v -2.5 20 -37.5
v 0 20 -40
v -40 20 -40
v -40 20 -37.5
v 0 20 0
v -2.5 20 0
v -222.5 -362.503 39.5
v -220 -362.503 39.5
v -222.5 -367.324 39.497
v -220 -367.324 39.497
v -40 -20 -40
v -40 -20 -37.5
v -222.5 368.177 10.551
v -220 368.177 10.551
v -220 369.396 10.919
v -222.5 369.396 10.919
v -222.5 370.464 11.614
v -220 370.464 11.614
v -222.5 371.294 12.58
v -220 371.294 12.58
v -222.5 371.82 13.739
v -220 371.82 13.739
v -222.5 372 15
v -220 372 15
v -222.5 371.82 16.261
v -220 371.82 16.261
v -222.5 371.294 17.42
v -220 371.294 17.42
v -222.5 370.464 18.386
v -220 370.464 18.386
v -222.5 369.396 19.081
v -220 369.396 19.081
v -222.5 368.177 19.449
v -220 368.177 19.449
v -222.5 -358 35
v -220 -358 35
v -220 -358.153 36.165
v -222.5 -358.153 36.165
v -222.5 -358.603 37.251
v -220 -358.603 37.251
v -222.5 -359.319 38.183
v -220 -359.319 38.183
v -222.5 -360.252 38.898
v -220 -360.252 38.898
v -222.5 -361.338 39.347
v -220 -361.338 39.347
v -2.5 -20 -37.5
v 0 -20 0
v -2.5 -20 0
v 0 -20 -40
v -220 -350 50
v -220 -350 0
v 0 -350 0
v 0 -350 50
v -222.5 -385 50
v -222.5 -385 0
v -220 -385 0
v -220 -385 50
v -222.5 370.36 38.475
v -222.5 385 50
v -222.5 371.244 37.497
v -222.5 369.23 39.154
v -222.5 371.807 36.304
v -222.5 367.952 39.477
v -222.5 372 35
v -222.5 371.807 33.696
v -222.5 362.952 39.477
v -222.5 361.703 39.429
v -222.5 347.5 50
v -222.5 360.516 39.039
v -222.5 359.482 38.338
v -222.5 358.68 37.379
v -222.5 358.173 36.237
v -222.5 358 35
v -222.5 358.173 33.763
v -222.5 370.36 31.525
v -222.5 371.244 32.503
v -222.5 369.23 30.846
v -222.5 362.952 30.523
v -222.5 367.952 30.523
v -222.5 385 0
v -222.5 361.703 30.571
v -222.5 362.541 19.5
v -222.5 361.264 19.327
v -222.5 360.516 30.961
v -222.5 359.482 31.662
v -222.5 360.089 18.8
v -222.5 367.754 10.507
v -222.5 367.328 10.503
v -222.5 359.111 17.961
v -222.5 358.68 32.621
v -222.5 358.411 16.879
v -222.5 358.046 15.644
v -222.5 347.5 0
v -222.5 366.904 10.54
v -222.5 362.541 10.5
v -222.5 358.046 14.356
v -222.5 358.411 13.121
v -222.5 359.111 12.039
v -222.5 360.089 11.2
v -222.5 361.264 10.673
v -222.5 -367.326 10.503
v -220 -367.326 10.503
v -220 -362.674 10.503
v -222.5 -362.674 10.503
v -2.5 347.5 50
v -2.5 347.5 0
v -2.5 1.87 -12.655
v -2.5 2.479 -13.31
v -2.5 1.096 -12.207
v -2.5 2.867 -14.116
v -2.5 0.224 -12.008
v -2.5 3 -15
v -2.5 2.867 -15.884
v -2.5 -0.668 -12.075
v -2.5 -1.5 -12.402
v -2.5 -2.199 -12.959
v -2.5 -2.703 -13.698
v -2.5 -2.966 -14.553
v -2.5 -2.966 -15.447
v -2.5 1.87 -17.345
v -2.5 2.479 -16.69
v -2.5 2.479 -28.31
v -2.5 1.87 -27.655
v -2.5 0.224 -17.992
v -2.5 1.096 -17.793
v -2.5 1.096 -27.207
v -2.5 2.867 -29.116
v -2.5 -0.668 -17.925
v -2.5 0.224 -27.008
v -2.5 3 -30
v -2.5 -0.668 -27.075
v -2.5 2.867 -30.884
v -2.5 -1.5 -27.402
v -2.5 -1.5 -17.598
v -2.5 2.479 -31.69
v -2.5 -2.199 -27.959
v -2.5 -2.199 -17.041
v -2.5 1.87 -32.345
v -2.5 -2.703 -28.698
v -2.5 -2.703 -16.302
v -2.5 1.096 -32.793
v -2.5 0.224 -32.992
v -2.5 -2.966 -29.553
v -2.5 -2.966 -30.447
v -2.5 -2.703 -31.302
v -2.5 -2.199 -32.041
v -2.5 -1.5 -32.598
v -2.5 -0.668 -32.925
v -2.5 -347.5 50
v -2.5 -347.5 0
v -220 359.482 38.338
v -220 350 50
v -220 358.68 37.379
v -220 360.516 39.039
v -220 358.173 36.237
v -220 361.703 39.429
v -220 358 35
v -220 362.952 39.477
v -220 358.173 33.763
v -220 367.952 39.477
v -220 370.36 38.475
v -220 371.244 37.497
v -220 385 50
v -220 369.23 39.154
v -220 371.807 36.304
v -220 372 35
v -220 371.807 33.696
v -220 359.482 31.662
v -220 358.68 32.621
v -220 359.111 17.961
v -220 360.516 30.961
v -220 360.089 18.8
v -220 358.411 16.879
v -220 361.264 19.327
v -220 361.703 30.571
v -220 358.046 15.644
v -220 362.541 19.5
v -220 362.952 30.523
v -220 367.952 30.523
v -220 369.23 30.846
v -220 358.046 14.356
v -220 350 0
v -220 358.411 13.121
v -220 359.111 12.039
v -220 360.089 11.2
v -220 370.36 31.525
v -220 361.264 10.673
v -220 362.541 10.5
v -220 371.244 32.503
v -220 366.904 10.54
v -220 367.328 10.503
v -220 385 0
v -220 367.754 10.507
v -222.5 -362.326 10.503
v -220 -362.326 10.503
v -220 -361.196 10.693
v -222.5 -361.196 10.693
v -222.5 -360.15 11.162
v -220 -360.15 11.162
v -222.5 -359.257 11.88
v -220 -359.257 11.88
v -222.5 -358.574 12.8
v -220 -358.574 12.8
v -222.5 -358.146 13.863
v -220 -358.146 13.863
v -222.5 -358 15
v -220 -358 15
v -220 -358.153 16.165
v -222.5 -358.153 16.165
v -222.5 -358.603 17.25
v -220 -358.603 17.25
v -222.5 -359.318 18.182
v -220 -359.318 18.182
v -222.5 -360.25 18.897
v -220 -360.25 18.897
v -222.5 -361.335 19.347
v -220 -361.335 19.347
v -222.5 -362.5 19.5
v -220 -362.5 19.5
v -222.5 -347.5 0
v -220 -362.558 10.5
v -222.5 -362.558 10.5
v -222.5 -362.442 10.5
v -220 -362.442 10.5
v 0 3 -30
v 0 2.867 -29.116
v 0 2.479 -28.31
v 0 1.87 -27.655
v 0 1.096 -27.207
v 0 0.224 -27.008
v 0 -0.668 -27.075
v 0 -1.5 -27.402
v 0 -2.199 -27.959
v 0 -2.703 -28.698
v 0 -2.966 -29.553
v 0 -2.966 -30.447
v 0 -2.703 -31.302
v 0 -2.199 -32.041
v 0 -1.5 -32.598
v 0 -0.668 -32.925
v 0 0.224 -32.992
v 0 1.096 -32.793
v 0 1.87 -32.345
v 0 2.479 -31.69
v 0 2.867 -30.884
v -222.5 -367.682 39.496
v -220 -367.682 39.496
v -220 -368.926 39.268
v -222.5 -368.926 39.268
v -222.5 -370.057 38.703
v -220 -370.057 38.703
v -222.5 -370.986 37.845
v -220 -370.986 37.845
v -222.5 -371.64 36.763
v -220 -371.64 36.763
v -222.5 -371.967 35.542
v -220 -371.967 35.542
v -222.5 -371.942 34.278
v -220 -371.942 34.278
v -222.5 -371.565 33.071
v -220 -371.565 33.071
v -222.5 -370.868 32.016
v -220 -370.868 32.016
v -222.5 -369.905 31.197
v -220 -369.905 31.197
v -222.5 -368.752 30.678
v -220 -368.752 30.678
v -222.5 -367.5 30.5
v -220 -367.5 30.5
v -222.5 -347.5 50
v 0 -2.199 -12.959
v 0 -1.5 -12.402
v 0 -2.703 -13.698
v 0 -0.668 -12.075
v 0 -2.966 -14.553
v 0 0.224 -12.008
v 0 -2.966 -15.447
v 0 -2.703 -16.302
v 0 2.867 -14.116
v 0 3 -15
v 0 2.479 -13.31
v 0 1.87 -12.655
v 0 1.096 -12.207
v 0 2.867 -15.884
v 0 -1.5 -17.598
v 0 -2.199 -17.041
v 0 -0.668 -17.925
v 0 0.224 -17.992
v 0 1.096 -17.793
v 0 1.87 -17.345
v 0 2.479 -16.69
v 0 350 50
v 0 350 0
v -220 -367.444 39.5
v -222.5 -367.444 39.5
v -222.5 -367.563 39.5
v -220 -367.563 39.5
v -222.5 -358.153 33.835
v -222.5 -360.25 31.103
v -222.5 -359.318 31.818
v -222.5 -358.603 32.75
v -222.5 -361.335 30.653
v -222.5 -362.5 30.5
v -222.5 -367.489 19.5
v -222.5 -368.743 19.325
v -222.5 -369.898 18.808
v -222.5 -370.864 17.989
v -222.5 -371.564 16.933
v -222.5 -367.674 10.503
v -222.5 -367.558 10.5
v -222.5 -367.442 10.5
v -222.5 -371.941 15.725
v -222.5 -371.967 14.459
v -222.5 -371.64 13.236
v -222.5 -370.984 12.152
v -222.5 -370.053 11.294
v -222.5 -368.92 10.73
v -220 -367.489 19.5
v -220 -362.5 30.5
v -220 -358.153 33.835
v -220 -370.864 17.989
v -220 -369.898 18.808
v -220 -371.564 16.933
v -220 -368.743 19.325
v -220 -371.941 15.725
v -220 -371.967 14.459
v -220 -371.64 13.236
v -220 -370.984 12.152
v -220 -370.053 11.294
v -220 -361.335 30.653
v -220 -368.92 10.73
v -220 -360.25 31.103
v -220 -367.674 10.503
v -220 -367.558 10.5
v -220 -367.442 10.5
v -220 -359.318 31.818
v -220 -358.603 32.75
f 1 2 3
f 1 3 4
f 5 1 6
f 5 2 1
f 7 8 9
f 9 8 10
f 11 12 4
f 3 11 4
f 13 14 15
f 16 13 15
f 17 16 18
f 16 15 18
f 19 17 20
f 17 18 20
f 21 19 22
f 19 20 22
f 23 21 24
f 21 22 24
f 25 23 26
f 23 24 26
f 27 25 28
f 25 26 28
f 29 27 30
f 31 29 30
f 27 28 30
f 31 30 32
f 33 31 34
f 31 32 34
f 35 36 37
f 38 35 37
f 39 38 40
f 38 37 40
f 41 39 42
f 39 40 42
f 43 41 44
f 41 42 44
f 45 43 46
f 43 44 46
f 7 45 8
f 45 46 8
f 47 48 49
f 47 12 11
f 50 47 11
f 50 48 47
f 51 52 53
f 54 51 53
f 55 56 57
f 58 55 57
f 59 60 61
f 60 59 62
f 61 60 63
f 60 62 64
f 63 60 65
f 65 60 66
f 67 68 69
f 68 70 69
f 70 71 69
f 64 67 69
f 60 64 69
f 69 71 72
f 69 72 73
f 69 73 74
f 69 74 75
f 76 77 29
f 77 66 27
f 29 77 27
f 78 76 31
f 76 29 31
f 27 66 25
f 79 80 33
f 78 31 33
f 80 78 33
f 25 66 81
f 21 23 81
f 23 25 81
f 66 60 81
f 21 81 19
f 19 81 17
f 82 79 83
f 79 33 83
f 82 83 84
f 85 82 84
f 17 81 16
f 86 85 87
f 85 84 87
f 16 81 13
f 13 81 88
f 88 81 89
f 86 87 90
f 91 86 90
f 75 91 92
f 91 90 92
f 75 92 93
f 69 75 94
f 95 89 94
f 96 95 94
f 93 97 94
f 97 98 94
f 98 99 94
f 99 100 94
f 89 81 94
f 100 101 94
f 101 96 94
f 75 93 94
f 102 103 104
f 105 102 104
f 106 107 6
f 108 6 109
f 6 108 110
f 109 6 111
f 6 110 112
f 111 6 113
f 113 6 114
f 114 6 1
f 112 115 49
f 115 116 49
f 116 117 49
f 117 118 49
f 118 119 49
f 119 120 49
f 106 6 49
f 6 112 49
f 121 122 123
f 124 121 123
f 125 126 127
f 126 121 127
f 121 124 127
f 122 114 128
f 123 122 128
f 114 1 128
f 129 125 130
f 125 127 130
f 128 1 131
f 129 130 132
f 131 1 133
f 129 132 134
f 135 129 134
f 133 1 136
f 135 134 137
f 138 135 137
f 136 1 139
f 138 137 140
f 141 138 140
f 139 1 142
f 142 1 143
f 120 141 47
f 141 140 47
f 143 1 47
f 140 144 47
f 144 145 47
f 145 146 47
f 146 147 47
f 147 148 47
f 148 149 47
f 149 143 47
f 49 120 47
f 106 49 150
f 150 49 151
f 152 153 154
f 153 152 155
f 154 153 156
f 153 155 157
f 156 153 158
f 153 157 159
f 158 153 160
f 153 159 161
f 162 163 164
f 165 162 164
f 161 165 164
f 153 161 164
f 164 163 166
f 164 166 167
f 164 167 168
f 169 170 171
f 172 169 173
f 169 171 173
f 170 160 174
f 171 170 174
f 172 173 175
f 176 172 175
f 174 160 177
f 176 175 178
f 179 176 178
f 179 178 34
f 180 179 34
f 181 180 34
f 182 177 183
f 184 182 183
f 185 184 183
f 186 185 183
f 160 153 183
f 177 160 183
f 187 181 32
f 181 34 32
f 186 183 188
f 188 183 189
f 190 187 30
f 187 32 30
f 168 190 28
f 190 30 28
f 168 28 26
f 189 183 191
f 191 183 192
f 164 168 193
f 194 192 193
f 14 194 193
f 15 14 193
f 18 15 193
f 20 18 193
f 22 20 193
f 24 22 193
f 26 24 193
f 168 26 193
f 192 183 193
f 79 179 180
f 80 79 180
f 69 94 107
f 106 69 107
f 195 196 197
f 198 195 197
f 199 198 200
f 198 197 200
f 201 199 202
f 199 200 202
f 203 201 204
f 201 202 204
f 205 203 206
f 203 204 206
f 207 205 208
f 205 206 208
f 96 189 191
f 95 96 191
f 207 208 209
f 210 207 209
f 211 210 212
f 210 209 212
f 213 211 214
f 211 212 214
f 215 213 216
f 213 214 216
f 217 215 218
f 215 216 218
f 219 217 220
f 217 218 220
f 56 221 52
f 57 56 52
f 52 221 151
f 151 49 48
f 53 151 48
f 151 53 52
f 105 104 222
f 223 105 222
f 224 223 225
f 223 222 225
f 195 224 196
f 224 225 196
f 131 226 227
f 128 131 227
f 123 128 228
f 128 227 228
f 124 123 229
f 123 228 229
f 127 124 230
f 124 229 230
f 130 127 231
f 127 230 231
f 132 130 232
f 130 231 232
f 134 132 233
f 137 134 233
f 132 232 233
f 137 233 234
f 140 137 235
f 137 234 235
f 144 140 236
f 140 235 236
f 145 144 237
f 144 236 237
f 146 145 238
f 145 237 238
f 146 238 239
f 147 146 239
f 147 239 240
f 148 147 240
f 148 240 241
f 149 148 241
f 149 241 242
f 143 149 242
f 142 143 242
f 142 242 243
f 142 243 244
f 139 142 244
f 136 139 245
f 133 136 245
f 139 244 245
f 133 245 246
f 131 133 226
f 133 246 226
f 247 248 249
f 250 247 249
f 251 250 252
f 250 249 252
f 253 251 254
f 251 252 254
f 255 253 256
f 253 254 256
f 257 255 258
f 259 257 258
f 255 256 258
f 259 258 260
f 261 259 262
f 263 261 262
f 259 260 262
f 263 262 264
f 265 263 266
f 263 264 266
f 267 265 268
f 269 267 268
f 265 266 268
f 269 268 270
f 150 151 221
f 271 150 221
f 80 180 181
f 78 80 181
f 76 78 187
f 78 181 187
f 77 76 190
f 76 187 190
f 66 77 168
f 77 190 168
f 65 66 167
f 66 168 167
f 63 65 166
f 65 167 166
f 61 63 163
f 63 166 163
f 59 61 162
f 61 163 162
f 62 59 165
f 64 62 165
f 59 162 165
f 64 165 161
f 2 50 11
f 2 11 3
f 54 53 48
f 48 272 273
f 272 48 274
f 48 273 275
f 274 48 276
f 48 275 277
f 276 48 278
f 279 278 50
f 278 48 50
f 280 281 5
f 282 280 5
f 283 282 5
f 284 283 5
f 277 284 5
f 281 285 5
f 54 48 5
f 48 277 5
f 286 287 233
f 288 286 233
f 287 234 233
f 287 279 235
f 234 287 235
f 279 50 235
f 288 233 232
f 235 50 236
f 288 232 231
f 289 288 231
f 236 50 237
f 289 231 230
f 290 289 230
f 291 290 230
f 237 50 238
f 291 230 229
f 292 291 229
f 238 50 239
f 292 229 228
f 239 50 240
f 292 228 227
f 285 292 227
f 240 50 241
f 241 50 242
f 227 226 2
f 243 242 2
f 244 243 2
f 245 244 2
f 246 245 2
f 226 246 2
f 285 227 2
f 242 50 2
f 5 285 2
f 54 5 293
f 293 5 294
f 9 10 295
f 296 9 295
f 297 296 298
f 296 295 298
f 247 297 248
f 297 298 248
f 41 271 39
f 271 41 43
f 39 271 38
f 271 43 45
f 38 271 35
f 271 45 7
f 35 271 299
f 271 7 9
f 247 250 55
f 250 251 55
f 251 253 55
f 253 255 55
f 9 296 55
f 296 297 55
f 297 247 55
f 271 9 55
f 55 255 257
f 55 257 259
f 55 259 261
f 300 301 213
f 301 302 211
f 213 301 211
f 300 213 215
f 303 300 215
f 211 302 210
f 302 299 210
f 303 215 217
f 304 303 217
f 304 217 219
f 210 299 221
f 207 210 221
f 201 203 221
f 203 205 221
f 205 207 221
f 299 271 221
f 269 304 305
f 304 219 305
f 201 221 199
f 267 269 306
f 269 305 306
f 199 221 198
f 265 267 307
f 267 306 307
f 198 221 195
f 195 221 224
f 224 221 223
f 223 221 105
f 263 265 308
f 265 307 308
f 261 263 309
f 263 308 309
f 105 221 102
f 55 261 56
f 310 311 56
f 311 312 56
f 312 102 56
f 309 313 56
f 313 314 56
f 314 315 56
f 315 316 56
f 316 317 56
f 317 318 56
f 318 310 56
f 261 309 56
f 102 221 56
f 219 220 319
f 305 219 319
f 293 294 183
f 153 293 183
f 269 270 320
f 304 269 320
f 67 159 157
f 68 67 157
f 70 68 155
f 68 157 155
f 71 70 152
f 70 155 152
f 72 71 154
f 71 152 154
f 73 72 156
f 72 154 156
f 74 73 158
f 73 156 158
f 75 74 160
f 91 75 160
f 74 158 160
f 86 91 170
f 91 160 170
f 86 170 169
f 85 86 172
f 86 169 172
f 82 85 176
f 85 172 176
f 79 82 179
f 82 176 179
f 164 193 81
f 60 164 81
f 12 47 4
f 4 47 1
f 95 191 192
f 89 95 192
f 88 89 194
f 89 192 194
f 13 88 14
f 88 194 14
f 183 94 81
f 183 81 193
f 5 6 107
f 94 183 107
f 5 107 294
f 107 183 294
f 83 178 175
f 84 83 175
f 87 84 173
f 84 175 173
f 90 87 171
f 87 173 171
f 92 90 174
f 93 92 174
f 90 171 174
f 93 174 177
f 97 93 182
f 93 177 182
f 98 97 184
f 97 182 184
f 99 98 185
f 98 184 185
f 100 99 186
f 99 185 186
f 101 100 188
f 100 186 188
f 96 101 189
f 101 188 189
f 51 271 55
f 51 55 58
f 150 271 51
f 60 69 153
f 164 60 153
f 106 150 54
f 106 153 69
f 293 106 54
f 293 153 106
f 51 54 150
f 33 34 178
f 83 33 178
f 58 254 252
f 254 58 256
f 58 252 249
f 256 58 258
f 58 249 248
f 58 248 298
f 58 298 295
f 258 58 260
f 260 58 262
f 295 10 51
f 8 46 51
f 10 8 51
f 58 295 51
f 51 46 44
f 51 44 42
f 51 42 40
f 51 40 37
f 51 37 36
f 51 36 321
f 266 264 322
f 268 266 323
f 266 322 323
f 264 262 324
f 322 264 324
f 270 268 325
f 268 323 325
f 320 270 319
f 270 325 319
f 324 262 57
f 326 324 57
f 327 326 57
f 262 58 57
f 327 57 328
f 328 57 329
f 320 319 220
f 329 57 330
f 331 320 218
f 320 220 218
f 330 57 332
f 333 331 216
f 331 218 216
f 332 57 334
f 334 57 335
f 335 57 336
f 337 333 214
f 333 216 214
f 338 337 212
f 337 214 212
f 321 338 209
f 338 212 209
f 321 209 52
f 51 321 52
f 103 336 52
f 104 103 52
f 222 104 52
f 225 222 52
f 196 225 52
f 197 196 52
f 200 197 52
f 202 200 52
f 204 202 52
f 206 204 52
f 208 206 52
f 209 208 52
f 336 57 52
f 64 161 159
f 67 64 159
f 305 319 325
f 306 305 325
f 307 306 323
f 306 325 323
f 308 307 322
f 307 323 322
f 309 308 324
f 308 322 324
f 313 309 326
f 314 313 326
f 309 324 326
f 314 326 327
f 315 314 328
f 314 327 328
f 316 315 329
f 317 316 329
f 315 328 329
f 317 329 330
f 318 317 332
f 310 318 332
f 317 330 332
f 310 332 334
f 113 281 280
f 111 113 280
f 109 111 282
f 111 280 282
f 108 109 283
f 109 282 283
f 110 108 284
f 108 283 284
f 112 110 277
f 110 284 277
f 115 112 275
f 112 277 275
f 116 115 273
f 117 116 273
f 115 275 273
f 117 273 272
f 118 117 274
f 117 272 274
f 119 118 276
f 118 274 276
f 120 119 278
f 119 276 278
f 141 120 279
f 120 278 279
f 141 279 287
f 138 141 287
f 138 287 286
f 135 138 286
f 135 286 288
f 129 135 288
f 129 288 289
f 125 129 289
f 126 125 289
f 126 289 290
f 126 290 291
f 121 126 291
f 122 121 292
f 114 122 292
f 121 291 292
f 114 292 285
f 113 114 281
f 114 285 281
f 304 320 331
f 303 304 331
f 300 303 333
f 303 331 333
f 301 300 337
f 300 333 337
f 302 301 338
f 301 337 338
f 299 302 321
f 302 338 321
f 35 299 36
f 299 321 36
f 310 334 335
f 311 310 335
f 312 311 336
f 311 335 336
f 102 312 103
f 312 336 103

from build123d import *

# Parameters (mm, degrees)
F1_DEPTH  = 50
F2_R      = 3
F3_DEPTH  = 2.5
F5_DEPTH  = 3
F7_DEPTH  = 3
F8_W      = 40
F8_H      = 2.5
F9_DEPTH  = 40
F10_DEPTH = 25


with BuildPart() as f1:
    # F0 (on Top) → F1 (new body)
    with BuildSketch(Plane.XY):
        Polygon((-2.5, 0), (0, 0), (0, 350), (-220, 350), (-220, 385), (-222.5, 385), (-222.5, 347.5), (-2.5, 347.5), align=None)
        Polygon((0, -350), (0, 0), (-2.5, 0), (-2.5, -347.5), (-222.5, -347.5), (-222.5, -385), (-220, -385), (-220, -350), align=None)
    extrude(amount=F1_DEPTH)

    # F2 (on Right) → F3 (join)
    with BuildSketch(Plane.YZ):
        Polygon((20, 0), (0, 0), (-20, 0), (-20, -40), (20, -40), align=None)
        with Locations((0, -30)):
            Circle(F2_R, mode=Mode.SUBTRACT)
        with Locations((0, -15)):
            Circle(F2_R, mode=Mode.SUBTRACT)
    extrude(amount=-F3_DEPTH)

    # F4 (on face) → F5 (cut)
    with BuildSketch(Plane.YZ.offset(-220)):
        with BuildLine():
            Line((-367.324291, 39.496568), (-367.682109, 39.496314))
            ThreePointArc((-367.682109, 39.496314), (-371.999078, 34.908927), (-367.5, 30.5))
            ThreePointArc((-367.5, 30.5), (-366.193757, 30.693757), (-365, 31.258343))
            ThreePointArc((-365, 31.258343), (-366.468627, 32.87868), (-367, 35))
            ThreePointArc((-367, 35), (-366.468627, 37.12132), (-365, 38.741657))
            ThreePointArc((-365, 38.741657), (-366.109918, 39.279915), (-367.324291, 39.496568))
        make_face()
        with BuildLine():
            ThreePointArc((-367.324291, 39.496568), (-367.503202, 39.499999), (-367.682109, 39.496314))
            Line((-367.682109, 39.496314), (-367.324291, 39.496568))
        make_face()
        with BuildLine():
            ThreePointArc((-365, 31.258343), (-366.193757, 30.693757), (-367.5, 30.5))
            Line((-367.5, 30.5), (-362.5, 30.5))
            ThreePointArc((-362.5, 30.5), (-363.806243, 30.693757), (-365, 31.258343))
        make_face()
        with BuildLine():
            Line((-362.503202, 39.499999), (-367.324291, 39.496568))
            ThreePointArc((-367.324291, 39.496568), (-366.109918, 39.279915), (-365, 38.741657))
            ThreePointArc((-365, 38.741657), (-363.807775, 39.305778), (-362.503202, 39.499999))
        make_face()
        with BuildLine():
            ThreePointArc((-363, 35), (-363.531373, 32.87868), (-365, 31.258343))
            ThreePointArc((-365, 31.258343), (-363.806243, 30.693757), (-362.5, 30.5))
            ThreePointArc((-362.5, 30.5), (-359.318019, 31.818019), (-358, 35))
            ThreePointArc((-358, 35), (-359.319152, 38.183112), (-362.503202, 39.499999))
            ThreePointArc((-362.503202, 39.499999), (-363.807775, 39.305778), (-365, 38.741657))
            ThreePointArc((-365, 38.741657), (-363.531373, 37.12132), (-363, 35))
        make_face()
        with BuildLine():
            ThreePointArc((-365, 18.741657), (-366.188395, 19.304613), (-367.488792, 19.499986))
            ThreePointArc((-367.488792, 19.499986), (-371.999046, 15.092651), (-367.674064, 10.503368))
            Line((-367.674064, 10.503368), (-367.325936, 10.503368))
            ThreePointArc((-367.325936, 10.503368), (-366.110701, 10.719831), (-365, 11.258343))
            ThreePointArc((-365, 11.258343), (-366.468627, 12.87868), (-367, 15))
            ThreePointArc((-367, 15), (-366.468627, 17.12132), (-365, 18.741657))
        make_face()
        with BuildLine():
            Line((-362.500013, 19.5), (-367.488792, 19.499986))
            ThreePointArc((-367.488792, 19.499986), (-366.188395, 19.304613), (-365, 18.741657))
            ThreePointArc((-365, 18.741657), (-363.806249, 19.306241), (-362.500013, 19.5))
        make_face()
        with BuildLine():
            Line((-367.325936, 10.503368), (-367.674064, 10.503368))
            ThreePointArc((-367.674064, 10.503368), (-367.5, 10.5), (-367.325936, 10.503368))
        make_face()
        with BuildLine():
            ThreePointArc((-362.500013, 19.5), (-363.806249, 19.306241), (-365, 18.741657))
            ThreePointArc((-365, 18.741657), (-363.531373, 17.12132), (-363, 15))
            ThreePointArc((-363, 15), (-363.531373, 12.87868), (-365, 11.258343))
            ThreePointArc((-365, 11.258343), (-363.889299, 10.719831), (-362.674064, 10.503368))
            Line((-362.674064, 10.503368), (-362.325936, 10.503368))
            ThreePointArc((-362.325936, 10.503368), (-359.257062, 11.880167), (-358, 15))
            ThreePointArc((-358, 15), (-359.318024, 18.181985), (-362.500013, 19.5))
        make_face()
        with BuildLine():
            ThreePointArc((-365, 11.258343), (-366.110701, 10.719831), (-367.325936, 10.503368))
            Line((-367.325936, 10.503368), (-362.674064, 10.503368))
            ThreePointArc((-362.674064, 10.503368), (-363.889299, 10.719831), (-365, 11.258343))
        make_face()
        with BuildLine():
            Line((-362.325936, 10.503368), (-362.674064, 10.503368))
            ThreePointArc((-362.674064, 10.503368), (-362.5, 10.5), (-362.325936, 10.503368))
        make_face()
        with BuildLine():
            ThreePointArc((-363, 35), (-363.531373, 37.12132), (-365, 38.741657))
            ThreePointArc((-365, 38.741657), (-366.468627, 37.12132), (-367, 35))
            Line((-367, 35), (-363, 35))
        make_face()
        with BuildLine():
            ThreePointArc((-365, 11.258343), (-363.531373, 12.87868), (-363, 15))
            Line((-363, 15), (-367, 15))
            ThreePointArc((-367, 15), (-366.468627, 12.87868), (-365, 11.258343))
        make_face()
        with BuildLine():
            ThreePointArc((-363, 15), (-363.531373, 17.12132), (-365, 18.741657))
            ThreePointArc((-365, 18.741657), (-366.468627, 17.12132), (-367, 15))
            Line((-367, 15), (-363, 15))
        make_face()
        with BuildLine():
            ThreePointArc((-367, 35), (-366.468627, 32.87868), (-365, 31.258343))
            ThreePointArc((-365, 31.258343), (-363.531373, 32.87868), (-363, 35))
            Line((-363, 35), (-367, 35))
        make_face()
    extrude(amount=-F5_DEPTH, mode=Mode.SUBTRACT)

    # F6 (on face) → F7 (cut)
    with BuildSketch(Plane.YZ.offset(-220)):
        with BuildLine():
            Line((362.951623, 30.52272), (367.951623, 30.52272))
            ThreePointArc((367.951623, 30.52272), (372, 35), (367.951623, 39.47728))
            Line((367.951623, 39.47728), (362.951623, 39.47728))
            ThreePointArc((362.951623, 39.47728), (358, 35), (362.951623, 30.52272))
        make_face()
        with BuildLine():
            Line((368.176887, 10.5512), (366.903754, 10.539676))
            ThreePointArc((366.903754, 10.539676), (367.54073, 10.500184), (368.176887, 10.5512))
        make_face()
        with BuildLine():
            Line((362.54073, 10.500184), (366.903754, 10.539676))
            Line((366.903754, 10.539676), (368.176887, 10.5512))
            ThreePointArc((368.176887, 10.5512), (372, 15), (368.176887, 19.4488))
            Line((368.176887, 19.4488), (362.54073, 19.499816))
            ThreePointArc((362.54073, 19.499816), (358, 15), (362.54073, 10.500184))
        make_face()
    extrude(amount=-F7_DEPTH, mode=Mode.SUBTRACT)

    # F8 (on face) → F9 (join)
    with BuildSketch(Plane.YZ):
        with Locations((0, -38.75)):
            Rectangle(F8_W, F8_H)
    extrude(amount=-F9_DEPTH)

    # F6 (on face) → F10 (cut)
    with BuildSketch(Plane.YZ.offset(-220)):
        with BuildLine():
            Line((362.951623, 30.52272), (367.951623, 30.52272))
            ThreePointArc((367.951623, 30.52272), (372, 35), (367.951623, 39.47728))
            Line((367.951623, 39.47728), (362.951623, 39.47728))
            ThreePointArc((362.951623, 39.47728), (358, 35), (362.951623, 30.52272))
        make_face()
        with BuildLine():
            Line((368.176887, 10.5512), (366.903754, 10.539676))
            ThreePointArc((366.903754, 10.539676), (367.54073, 10.500184), (368.176887, 10.5512))
        make_face()
        with BuildLine():
            Line((362.54073, 10.500184), (366.903754, 10.539676))
            Line((366.903754, 10.539676), (368.176887, 10.5512))
            ThreePointArc((368.176887, 10.5512), (372, 15), (368.176887, 19.4488))
            Line((368.176887, 19.4488), (362.54073, 19.499816))
            ThreePointArc((362.54073, 19.499816), (358, 15), (362.54073, 10.500184))
        make_face()
    extrude(amount=-F10_DEPTH, mode=Mode.SUBTRACT)


solid = f1.part
